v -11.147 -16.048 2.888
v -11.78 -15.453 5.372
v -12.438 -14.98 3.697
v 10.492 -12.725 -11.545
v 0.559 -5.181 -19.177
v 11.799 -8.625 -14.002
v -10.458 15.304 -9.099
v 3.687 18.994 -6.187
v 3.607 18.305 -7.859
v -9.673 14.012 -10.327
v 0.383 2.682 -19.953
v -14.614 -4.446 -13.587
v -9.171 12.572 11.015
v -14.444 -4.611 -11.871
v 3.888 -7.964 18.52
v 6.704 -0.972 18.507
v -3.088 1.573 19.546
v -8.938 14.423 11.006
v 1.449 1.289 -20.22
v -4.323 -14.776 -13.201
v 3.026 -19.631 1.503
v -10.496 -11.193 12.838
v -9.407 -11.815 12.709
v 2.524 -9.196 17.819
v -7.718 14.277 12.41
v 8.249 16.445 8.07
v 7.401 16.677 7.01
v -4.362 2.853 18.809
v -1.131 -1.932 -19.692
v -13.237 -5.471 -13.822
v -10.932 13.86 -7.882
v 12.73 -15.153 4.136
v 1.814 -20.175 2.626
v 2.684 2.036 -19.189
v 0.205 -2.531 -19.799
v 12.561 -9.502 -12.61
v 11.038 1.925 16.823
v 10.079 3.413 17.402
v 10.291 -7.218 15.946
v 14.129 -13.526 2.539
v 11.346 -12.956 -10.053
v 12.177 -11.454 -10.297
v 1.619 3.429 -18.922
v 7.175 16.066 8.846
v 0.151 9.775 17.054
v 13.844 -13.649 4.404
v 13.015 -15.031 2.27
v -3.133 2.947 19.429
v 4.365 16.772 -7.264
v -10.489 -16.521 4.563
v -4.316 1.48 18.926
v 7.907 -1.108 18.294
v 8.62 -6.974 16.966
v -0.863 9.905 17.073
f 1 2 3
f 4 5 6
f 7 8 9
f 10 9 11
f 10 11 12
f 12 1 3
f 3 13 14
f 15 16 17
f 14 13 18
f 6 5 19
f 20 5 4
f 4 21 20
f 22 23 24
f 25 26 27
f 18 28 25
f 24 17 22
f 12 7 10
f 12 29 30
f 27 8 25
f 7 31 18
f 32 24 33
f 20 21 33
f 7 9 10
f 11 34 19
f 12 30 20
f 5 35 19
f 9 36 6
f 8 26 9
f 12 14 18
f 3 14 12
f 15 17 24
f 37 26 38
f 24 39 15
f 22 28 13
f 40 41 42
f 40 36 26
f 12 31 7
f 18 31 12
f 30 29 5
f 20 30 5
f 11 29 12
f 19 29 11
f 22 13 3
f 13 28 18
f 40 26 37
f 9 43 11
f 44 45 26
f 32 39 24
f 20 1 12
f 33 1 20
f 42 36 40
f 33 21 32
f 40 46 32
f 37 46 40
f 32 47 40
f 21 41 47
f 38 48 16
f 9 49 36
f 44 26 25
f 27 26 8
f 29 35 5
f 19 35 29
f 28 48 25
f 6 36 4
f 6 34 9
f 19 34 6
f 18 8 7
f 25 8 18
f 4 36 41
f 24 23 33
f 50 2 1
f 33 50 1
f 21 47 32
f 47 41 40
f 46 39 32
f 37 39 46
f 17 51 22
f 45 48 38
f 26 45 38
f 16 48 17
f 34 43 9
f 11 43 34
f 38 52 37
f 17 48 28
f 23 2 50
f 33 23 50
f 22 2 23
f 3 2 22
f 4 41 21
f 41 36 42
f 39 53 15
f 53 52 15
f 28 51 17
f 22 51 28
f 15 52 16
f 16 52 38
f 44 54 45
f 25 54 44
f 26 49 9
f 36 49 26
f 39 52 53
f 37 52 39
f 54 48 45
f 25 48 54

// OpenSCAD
/*

    STONE Generator
    
    Fernando Jerez 2017 
    License: CC-NC

*/

// This is only to force Customizer create many files. Changes doesnt matter. Just click CREATE THING
part = "one"; // [one:Stone #1, two:Stone #2, three:Stone #3, four:Stone #4,five:Stone #5,six:Stone #6,seven:Stone #7,eight:Stone #8,nine:Stone #9,ten:Stone #10]



// : More corners --> More spheric stones
number_of_corners = 20; // [5:30]

// : Deforms stone in vertical
z_scale = 1; // [0.2:0.1:3]


/* [Hidden] */
radius = 20;
corner_size = 2;

// Example
scale([1,1,z_scale])
randomRock(radius,corner_size,number_of_corners);



// Module...
module randomRock(radius,corner_size,number_of_corners){
    // Draw rock
    hull(){
        // Make a hull..
        for(i=[0:number_of_corners]){
            // random position in sphere
            y = rands(0,360,1)[0];
            z = rands(0,360,1)[0];
            rotate([0,y,z])
            
            // translate radius (minus half of corner size)
            translate([radius-corner_size*0.5,0,0])
            
            // draw cube as corner
            rotate([rands(0,360,1)[0],rands(0,360,1)[0],rands(0,360,1)[0]]) // random rotation
            cube(rands(corner_size*0.5,corner_size,1)[0],center = true);
            
        }
    }

    // Done
}
